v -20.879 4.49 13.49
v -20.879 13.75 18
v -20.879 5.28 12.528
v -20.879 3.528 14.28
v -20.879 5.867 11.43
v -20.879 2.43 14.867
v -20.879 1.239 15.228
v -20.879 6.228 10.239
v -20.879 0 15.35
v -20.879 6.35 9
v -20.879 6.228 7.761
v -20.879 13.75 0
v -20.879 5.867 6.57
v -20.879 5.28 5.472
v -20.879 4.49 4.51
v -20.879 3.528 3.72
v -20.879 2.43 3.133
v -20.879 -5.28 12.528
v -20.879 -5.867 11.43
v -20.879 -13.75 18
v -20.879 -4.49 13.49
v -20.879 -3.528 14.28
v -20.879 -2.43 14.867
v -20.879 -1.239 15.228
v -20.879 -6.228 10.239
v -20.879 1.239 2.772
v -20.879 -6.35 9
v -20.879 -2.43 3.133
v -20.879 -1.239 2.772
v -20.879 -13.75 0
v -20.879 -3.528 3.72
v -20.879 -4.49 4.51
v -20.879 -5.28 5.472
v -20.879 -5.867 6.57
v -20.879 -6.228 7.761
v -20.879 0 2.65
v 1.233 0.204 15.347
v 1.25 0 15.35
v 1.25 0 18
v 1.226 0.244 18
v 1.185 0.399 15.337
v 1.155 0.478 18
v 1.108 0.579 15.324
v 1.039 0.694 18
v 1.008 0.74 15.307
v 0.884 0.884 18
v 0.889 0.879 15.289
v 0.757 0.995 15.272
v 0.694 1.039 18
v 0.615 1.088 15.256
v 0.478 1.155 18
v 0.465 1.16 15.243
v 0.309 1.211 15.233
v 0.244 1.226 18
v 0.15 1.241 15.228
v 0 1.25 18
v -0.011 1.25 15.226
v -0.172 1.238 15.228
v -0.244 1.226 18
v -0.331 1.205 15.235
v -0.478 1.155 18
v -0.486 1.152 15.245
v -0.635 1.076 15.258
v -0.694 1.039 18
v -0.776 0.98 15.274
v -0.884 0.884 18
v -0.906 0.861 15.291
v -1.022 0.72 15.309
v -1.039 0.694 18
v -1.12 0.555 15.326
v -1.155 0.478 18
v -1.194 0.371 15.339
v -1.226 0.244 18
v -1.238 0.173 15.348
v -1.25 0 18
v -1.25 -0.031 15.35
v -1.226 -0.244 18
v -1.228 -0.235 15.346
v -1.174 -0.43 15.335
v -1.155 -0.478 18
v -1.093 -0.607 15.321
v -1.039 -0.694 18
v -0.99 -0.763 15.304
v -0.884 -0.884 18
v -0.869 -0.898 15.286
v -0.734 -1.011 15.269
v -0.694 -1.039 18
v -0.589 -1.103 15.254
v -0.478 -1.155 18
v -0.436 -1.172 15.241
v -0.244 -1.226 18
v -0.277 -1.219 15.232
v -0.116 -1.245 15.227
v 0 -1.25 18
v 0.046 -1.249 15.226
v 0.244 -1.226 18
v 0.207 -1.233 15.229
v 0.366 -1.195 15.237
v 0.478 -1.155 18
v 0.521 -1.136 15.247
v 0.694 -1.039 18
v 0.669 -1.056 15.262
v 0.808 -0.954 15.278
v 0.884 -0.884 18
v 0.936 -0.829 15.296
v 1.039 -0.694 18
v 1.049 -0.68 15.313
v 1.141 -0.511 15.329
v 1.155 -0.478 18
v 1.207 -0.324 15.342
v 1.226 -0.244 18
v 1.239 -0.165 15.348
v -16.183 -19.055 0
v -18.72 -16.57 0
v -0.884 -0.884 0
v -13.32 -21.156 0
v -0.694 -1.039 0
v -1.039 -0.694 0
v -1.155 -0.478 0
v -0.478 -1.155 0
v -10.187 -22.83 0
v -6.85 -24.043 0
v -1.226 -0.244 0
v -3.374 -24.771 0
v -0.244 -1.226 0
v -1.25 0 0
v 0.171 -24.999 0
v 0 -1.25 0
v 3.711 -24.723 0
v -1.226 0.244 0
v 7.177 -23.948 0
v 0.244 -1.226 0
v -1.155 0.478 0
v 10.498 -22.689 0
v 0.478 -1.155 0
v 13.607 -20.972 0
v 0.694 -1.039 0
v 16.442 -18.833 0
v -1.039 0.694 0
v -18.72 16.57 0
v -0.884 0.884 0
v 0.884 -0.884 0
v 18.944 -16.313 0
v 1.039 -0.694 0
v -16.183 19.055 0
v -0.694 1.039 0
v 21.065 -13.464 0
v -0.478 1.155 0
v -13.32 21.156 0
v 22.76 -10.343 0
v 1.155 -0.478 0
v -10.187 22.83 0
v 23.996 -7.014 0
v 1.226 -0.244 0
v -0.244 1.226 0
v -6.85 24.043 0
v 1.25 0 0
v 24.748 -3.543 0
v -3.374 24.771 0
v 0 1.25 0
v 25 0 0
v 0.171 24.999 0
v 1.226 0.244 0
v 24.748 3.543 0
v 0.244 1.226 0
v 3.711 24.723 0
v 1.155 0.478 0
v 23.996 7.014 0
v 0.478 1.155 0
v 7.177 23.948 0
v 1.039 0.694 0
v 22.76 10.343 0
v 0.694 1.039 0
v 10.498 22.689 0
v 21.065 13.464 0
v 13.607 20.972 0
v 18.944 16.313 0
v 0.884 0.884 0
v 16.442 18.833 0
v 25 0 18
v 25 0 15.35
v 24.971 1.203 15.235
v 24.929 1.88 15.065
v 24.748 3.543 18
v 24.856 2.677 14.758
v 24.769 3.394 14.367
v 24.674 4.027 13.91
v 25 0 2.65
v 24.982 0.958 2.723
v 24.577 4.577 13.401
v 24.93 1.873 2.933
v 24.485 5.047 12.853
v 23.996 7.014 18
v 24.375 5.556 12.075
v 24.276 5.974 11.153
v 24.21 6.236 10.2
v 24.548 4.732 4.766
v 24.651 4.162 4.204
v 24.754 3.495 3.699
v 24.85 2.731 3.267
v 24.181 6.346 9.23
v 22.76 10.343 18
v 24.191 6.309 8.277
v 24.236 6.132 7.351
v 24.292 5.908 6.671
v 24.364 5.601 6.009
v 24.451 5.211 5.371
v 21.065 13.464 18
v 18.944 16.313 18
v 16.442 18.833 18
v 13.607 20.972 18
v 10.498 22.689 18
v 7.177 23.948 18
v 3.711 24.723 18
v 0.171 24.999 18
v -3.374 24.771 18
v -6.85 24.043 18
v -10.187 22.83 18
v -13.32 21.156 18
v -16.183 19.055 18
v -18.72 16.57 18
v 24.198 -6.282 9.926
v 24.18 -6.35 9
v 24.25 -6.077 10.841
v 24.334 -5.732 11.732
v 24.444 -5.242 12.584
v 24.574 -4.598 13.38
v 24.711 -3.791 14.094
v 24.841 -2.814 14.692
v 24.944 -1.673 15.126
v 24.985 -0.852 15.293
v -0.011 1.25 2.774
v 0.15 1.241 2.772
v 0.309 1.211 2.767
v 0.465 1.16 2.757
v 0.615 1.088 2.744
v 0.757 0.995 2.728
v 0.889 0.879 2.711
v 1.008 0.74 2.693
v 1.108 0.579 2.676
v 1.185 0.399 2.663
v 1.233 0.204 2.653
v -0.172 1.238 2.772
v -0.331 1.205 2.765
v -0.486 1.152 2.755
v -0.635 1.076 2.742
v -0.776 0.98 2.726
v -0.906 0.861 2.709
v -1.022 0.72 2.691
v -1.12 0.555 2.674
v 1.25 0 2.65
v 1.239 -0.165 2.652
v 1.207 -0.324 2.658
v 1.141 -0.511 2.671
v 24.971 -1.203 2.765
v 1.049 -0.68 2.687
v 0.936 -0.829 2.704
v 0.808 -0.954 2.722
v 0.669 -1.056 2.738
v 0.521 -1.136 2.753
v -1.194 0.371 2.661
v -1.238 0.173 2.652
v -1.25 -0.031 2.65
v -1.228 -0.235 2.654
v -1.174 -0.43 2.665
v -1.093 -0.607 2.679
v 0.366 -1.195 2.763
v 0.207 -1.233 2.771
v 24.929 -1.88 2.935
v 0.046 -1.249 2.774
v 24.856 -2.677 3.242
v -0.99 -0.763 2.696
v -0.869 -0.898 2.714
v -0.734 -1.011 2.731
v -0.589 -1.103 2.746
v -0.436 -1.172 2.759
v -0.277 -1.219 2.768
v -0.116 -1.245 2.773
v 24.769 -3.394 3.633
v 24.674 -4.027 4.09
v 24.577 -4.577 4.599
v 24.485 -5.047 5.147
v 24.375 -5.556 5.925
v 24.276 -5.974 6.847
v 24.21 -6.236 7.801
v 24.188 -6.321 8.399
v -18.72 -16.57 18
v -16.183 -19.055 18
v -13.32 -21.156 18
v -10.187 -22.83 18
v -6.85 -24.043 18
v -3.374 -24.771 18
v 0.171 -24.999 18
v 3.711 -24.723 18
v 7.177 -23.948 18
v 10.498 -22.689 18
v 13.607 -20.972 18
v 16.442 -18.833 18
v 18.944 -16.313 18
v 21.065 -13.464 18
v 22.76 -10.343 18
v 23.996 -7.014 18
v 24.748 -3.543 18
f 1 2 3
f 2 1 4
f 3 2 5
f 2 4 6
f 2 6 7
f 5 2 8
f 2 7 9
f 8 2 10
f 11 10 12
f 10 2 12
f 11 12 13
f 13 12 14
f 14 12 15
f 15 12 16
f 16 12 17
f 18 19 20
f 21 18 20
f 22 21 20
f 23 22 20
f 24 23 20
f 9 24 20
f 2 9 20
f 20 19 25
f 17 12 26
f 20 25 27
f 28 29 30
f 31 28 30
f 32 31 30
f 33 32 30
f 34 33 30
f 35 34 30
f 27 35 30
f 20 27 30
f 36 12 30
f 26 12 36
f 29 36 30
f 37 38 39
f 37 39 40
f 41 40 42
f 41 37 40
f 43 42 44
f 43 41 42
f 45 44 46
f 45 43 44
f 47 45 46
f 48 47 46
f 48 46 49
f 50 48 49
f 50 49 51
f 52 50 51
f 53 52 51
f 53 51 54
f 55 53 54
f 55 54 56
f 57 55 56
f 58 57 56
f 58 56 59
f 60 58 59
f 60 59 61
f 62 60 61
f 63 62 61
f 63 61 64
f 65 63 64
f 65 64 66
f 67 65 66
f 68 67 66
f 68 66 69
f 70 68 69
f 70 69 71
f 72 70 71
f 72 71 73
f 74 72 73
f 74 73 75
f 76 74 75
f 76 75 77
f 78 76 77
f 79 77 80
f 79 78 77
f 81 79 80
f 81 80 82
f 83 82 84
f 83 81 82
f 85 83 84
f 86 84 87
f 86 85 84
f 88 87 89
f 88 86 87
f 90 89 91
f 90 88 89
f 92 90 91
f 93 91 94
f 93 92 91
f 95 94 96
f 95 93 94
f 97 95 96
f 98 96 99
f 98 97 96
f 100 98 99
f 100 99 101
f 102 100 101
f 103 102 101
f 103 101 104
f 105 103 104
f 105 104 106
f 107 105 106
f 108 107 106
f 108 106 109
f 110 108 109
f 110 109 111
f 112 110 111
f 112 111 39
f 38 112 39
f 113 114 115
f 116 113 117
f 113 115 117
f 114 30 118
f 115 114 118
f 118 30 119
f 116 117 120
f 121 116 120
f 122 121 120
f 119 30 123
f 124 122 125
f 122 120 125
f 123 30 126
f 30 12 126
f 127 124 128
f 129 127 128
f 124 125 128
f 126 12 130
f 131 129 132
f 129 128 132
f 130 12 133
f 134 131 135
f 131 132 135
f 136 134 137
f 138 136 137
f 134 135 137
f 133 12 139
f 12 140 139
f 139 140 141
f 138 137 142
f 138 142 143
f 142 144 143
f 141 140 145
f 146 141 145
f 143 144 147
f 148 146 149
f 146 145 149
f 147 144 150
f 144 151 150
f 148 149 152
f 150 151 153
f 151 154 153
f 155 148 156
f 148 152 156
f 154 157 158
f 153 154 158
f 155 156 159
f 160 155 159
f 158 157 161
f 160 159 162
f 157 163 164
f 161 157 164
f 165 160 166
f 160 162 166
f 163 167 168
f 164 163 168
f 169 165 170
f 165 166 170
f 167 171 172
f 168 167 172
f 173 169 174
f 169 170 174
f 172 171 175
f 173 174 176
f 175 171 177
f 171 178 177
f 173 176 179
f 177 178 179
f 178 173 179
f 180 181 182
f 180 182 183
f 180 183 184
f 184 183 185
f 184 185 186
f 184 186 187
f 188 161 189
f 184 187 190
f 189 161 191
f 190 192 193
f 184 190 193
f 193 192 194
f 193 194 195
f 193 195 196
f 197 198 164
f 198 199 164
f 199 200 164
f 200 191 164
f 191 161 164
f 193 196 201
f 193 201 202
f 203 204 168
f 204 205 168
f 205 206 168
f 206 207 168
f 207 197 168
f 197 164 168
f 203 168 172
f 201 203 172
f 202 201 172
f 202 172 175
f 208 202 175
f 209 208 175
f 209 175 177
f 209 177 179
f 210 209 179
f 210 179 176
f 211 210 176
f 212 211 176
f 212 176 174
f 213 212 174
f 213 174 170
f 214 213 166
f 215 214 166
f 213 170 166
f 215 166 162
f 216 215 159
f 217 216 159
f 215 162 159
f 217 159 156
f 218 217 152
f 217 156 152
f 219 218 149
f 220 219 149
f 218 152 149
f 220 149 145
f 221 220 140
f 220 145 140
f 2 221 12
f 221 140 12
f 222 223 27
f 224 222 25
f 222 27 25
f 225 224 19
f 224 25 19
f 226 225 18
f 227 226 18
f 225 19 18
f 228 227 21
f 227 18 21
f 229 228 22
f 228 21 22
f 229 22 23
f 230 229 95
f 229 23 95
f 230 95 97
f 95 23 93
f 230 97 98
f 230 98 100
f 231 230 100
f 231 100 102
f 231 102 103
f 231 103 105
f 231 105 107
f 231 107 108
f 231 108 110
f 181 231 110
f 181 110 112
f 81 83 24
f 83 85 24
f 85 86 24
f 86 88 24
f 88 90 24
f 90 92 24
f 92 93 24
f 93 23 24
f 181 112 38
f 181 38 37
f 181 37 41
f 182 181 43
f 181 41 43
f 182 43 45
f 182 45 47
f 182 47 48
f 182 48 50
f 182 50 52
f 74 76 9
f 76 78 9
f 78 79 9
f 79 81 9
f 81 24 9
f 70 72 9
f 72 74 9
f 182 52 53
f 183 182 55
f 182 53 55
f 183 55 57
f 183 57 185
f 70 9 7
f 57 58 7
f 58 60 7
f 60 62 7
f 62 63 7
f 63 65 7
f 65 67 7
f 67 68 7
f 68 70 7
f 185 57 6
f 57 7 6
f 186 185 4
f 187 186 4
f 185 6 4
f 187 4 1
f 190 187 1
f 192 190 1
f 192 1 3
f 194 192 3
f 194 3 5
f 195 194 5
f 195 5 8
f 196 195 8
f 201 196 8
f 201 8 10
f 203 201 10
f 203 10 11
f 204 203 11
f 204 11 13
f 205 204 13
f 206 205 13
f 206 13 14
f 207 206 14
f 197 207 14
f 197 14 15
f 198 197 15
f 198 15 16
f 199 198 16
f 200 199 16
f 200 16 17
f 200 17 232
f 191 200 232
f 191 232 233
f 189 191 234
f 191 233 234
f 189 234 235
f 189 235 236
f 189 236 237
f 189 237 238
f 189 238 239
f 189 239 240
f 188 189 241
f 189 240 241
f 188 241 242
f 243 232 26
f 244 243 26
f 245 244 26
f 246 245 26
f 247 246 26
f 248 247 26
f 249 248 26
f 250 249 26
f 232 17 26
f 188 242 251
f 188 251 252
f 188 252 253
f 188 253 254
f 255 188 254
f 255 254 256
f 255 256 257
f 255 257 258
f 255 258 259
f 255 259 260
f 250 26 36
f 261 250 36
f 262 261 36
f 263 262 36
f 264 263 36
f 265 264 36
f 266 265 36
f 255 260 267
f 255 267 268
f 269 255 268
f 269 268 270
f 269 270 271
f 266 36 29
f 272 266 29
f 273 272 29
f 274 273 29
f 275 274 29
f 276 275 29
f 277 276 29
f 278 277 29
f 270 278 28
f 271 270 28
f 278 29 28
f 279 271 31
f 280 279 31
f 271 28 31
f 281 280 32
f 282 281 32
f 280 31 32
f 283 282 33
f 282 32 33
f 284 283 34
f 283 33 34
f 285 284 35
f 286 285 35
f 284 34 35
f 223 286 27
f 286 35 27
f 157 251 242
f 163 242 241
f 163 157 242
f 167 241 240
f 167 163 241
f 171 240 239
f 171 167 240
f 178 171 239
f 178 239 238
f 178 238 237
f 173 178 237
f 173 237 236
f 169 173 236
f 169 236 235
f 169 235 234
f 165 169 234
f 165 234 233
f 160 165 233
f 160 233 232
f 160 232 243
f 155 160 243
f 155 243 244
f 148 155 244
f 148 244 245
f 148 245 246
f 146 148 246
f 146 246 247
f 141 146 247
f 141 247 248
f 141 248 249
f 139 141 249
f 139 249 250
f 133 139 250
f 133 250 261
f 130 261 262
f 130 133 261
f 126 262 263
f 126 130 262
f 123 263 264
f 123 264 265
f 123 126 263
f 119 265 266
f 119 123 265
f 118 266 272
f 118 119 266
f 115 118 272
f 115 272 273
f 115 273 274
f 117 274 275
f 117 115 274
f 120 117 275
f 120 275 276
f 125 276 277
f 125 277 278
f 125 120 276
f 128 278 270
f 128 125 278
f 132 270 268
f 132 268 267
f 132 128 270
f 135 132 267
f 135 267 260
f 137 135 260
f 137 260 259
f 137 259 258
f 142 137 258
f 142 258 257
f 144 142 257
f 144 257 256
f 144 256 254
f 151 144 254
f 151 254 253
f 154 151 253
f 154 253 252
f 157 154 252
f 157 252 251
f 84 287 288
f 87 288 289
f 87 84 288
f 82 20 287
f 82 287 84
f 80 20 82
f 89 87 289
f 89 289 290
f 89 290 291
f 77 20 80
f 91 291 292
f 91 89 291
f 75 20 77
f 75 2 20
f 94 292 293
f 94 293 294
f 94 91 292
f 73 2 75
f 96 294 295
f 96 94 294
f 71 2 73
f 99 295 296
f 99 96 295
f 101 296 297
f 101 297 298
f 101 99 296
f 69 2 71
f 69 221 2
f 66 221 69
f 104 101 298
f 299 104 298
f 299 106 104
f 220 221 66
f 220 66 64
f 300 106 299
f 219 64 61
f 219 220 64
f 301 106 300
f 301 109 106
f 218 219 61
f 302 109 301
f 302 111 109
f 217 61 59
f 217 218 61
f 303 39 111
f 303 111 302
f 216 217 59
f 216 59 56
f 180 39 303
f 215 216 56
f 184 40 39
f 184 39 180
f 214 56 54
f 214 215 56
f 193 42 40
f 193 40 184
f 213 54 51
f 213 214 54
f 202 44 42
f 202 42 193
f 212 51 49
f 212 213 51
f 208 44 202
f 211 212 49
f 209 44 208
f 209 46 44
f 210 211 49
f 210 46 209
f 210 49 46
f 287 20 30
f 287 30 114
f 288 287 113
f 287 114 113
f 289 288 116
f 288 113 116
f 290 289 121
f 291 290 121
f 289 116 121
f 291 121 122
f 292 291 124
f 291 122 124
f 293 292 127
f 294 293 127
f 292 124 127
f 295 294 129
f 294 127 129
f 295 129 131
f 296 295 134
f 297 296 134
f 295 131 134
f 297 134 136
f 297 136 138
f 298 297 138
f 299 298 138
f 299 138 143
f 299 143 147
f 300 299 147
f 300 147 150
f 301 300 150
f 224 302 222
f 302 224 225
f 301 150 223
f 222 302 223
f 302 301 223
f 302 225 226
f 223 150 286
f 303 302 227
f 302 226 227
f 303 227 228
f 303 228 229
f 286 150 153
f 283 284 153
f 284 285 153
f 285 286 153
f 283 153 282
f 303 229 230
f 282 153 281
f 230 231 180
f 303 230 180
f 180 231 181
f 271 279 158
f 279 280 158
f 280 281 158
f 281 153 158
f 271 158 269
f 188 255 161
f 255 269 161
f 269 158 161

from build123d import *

# Parameters (mm, degrees)
F0_R     = 1.25
F1_DEPTH = 18
F2_R     = 6.35
F3_DEPTH = 59.8157


with BuildPart() as f1:
    # F0 (on Top) → F1 (new body)
    with BuildSketch(Plane.XY):
        with BuildLine():
            ThreePointArc((-20.879116, -13.75), (7.17712, -23.947629), (25, 0))
            ThreePointArc((25, 0), (7.17712, 23.947629), (-20.879116, 13.75))
            Line((-20.879116, 13.75), (-20.879116, -13.75))
        make_face()
        Circle(F0_R, mode=Mode.SUBTRACT)
    extrude(amount=F1_DEPTH)

    # F2 (on face) → F3 (cut)
    with BuildSketch(Plane(origin=(-20.879116, 0, 0), x_dir=(0, -1, 0), z_dir=(-1, 0, 0))):
        with Locations((0, 9)):
            Circle(F2_R)
    extrude(amount=-F3_DEPTH, mode=Mode.SUBTRACT)


solid = f1.part
